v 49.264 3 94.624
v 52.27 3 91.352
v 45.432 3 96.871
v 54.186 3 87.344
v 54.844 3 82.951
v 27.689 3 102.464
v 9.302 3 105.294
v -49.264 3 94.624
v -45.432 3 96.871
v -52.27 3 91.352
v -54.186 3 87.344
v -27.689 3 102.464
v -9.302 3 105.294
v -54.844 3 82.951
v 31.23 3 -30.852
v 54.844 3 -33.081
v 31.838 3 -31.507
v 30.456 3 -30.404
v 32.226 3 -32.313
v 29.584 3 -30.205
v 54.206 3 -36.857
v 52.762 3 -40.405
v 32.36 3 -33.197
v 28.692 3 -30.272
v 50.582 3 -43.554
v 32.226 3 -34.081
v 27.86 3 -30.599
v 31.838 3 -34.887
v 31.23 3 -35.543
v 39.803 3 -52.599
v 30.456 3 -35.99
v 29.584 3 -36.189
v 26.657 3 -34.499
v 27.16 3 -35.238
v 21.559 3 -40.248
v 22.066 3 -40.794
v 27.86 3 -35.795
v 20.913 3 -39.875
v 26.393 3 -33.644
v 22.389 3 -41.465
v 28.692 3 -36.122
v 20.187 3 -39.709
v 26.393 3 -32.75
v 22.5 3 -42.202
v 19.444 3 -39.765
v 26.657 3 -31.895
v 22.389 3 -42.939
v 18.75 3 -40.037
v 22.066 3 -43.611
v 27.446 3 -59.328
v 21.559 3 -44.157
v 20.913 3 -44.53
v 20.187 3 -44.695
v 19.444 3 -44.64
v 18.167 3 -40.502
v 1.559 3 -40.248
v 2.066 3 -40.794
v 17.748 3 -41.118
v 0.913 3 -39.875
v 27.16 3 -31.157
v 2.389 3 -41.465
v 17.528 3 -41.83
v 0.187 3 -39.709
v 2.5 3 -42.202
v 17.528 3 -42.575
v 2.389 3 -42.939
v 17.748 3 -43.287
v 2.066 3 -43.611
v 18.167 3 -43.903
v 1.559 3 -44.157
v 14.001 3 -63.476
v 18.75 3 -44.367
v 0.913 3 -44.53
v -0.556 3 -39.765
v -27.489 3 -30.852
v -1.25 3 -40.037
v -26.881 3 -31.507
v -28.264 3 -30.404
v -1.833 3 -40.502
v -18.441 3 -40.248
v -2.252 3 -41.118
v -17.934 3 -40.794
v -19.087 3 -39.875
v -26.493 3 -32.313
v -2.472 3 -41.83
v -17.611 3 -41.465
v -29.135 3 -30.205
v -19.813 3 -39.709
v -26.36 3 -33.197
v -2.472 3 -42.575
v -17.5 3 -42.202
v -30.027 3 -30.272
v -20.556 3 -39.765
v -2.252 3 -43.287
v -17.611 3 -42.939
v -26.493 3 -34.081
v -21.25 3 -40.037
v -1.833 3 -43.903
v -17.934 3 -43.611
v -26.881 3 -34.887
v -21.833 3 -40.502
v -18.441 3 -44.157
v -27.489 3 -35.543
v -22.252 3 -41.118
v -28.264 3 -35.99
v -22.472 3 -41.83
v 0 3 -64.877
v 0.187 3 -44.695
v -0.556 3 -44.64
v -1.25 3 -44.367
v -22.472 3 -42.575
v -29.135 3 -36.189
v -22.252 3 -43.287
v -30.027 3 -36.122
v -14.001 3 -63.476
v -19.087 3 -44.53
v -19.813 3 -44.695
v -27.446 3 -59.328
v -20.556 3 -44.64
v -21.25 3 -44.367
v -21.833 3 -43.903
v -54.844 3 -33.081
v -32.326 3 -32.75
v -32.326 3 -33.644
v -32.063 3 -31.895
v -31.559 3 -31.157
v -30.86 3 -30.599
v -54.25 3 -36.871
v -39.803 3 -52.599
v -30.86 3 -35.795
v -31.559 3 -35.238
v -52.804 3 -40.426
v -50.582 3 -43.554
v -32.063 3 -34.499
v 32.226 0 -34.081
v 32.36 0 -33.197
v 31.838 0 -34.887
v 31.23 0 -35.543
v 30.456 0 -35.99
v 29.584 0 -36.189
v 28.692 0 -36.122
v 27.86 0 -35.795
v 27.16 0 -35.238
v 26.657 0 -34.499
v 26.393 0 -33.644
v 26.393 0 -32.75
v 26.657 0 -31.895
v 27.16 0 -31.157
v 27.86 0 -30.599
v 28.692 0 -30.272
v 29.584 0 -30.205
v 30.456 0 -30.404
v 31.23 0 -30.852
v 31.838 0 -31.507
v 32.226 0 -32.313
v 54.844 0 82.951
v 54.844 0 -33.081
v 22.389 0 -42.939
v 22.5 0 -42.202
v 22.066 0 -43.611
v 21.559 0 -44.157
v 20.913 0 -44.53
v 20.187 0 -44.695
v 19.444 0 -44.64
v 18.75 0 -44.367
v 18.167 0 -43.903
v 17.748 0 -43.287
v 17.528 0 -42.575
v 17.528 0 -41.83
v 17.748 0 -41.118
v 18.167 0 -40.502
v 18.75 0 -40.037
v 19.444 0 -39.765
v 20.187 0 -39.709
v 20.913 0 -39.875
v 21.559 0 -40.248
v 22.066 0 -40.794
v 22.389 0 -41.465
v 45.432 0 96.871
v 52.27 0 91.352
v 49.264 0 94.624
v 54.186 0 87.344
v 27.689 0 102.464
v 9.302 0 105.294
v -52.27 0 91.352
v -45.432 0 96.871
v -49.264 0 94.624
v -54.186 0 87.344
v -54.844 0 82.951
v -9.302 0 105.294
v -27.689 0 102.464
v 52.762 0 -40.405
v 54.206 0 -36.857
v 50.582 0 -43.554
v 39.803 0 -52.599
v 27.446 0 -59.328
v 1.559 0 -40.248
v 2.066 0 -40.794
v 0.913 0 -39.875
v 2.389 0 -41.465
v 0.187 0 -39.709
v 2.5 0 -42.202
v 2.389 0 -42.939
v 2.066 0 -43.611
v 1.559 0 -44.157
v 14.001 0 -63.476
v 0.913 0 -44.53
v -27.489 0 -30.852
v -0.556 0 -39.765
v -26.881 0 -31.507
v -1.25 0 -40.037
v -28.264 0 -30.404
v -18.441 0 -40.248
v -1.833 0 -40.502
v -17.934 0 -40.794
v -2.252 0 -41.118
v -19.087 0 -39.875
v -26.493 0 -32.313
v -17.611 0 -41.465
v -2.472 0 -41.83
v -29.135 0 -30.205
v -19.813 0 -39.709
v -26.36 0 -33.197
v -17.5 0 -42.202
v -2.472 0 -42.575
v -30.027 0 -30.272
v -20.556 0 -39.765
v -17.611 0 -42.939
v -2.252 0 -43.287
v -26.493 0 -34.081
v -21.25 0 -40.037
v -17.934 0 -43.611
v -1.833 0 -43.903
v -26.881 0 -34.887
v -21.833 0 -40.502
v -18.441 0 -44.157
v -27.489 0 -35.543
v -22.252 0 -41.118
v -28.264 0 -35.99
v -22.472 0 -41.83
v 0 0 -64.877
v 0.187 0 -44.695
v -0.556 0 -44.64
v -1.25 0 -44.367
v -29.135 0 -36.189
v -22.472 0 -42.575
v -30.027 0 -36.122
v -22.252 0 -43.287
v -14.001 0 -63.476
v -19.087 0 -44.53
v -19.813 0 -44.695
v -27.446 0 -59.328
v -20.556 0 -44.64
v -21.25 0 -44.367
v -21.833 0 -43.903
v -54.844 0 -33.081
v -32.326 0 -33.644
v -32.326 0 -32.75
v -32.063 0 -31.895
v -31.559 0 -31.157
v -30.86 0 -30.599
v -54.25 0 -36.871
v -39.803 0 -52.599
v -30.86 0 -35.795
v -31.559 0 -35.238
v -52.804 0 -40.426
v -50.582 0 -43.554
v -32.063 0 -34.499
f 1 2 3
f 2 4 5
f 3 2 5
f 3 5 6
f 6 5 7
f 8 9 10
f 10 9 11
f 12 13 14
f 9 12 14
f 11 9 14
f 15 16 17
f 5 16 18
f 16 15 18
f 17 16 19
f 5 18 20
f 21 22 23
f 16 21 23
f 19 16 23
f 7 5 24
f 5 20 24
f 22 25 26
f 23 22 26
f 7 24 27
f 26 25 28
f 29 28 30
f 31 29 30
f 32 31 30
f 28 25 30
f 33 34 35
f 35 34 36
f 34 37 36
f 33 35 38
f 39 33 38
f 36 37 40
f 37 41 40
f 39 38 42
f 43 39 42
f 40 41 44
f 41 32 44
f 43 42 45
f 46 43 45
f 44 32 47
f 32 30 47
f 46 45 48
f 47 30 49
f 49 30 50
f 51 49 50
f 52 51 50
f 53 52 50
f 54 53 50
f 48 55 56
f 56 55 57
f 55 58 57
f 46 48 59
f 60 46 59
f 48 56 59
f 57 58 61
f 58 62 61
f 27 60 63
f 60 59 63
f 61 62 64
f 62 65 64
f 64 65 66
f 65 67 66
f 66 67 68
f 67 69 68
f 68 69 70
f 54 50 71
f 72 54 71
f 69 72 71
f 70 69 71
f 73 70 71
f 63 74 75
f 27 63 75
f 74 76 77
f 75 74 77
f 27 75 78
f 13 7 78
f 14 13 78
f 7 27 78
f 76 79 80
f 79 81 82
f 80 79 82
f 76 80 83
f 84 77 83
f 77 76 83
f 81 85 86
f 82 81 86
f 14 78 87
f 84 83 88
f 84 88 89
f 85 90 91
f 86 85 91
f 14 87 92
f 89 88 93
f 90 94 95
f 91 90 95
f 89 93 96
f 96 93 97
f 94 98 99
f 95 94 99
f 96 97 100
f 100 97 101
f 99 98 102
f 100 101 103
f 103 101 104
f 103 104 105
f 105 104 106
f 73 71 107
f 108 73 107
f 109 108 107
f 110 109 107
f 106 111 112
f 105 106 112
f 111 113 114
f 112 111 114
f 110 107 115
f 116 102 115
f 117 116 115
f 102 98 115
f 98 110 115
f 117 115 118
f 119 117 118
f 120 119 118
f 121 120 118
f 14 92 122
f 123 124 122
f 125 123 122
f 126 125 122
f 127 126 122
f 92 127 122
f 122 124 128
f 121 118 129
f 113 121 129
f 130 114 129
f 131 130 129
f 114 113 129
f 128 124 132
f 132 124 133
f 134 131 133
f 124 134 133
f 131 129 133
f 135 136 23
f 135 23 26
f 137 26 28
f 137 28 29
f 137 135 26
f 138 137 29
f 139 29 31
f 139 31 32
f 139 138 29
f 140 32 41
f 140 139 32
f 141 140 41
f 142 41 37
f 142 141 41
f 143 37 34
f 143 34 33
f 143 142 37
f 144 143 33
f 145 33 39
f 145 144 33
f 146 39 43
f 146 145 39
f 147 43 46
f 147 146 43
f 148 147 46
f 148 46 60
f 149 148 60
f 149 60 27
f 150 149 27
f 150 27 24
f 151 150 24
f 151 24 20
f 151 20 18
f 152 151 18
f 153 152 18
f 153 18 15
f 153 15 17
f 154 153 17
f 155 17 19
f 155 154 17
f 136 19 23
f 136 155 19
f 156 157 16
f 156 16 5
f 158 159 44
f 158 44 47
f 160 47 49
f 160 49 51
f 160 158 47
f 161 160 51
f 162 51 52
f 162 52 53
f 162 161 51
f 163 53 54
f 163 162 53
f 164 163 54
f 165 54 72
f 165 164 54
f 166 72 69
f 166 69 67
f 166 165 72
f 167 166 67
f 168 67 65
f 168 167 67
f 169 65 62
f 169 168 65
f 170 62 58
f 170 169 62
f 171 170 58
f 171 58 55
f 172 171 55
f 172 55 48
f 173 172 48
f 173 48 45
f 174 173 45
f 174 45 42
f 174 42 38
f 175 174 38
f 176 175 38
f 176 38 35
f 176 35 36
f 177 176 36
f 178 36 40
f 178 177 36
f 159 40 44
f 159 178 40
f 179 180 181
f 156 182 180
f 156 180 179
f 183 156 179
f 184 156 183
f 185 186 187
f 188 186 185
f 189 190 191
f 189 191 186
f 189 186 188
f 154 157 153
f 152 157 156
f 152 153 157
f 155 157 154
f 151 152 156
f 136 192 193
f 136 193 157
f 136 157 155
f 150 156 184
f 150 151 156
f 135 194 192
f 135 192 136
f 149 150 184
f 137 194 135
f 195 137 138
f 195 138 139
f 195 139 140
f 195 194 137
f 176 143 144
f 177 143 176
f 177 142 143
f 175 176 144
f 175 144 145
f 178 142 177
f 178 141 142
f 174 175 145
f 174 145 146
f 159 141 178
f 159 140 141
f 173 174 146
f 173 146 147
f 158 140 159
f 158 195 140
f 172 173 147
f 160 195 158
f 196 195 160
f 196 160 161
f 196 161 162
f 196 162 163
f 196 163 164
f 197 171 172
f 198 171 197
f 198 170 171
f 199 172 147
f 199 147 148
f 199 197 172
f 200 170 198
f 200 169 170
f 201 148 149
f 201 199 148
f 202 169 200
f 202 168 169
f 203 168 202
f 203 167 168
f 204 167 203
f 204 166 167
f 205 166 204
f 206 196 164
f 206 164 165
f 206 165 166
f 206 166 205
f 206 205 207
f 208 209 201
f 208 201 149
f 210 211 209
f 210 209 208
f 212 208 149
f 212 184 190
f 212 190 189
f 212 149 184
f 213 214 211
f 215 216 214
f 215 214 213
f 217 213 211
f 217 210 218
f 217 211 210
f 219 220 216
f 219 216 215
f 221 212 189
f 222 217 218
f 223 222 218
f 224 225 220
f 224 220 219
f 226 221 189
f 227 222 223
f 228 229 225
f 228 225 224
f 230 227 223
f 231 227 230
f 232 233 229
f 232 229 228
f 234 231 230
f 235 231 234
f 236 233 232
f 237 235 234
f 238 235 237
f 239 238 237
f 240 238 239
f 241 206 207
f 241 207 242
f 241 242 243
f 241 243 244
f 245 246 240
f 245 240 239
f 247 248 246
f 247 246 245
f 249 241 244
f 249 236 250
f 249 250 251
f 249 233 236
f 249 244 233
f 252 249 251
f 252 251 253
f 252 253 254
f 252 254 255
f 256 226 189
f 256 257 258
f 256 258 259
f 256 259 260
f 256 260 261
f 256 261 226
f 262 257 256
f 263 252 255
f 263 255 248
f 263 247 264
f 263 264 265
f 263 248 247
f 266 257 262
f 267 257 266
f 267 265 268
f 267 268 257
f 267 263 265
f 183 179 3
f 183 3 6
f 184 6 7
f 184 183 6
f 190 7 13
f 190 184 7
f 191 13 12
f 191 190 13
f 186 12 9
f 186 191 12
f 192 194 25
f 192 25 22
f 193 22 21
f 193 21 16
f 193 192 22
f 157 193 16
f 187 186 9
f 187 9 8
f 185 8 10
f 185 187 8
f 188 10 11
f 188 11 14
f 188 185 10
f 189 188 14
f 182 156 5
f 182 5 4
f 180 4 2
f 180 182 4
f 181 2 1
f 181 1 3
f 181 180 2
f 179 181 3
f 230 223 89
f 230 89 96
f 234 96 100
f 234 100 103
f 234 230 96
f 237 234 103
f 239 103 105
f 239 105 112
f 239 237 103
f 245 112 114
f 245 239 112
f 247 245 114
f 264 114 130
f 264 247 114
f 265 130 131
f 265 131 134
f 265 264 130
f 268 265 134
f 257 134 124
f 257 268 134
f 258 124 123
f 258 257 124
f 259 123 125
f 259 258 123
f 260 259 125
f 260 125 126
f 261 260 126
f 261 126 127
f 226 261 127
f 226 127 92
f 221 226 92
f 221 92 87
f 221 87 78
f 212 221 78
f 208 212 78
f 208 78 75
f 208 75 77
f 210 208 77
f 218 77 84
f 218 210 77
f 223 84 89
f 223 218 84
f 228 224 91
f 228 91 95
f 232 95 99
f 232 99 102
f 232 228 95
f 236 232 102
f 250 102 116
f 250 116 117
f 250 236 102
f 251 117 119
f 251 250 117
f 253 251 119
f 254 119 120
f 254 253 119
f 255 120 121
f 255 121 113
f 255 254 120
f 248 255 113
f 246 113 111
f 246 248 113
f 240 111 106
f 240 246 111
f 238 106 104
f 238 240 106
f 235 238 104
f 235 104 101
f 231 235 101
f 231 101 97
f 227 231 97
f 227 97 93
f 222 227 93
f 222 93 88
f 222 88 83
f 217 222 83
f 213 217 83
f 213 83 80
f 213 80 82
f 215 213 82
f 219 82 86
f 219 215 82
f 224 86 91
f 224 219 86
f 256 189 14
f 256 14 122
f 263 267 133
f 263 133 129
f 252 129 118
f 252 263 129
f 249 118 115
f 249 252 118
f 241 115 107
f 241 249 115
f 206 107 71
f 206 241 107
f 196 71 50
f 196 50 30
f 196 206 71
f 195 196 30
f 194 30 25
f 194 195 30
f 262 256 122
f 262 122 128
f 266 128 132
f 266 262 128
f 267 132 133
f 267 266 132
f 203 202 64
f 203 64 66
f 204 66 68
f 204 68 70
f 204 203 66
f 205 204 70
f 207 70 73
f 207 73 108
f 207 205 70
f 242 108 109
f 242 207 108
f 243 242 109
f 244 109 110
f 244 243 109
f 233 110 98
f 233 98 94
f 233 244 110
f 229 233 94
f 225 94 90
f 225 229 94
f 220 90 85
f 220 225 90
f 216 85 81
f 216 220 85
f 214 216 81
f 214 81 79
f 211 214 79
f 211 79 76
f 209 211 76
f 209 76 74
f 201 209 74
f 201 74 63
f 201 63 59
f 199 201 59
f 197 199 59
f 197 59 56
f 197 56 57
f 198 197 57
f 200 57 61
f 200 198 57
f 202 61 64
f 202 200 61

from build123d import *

# Parameters (mm, degrees)
SKETCH2_R           = 3
SKETCH2_R_2         = 2.5
BOSS_EXTRUDE1_DEPTH = 3


with BuildPart() as part:
    # Sketch2 → Boss-Extrude1 (new body)
    with BuildSketch(Plane(origin=(0, 0, 0), x_dir=(1, 0, 0), z_dir=(0, 1, 0))):
        with BuildLine():
            Line((-54.843939578, -82.950592443), (-54.843939578, 33.080710792))
            ThreePointArc((-54.843939578, 33.080710792), (-53.629479142, 38.690320935), (-50.582114931, 43.554086088))
            ThreePointArc((-50.582114931, 43.554086088), (0, 64.876726435), (50.582114931, 43.554086088))
            ThreePointArc((50.582114931, 43.554086088), (53.581553542, 38.670819055), (54.843939578, 33.080710792))
            Line((54.843939578, 33.080710792), (54.843939578, -82.950592443))
            ThreePointArc((54.843939578, -82.950592443), (52.270146994, -91.352340431), (45.432023677, -96.870840864))
            ThreePointArc((45.432023677, -96.870840864), (0, -105.649395093), (-45.432023677, -96.870840864))
            ThreePointArc((-45.432023677, -96.870840864), (-52.270146994, -91.352340431), (-54.843939578, -82.950592443))
        make_face()
        with Locations((29.359626422, 33.197024949)):
            Circle(SKETCH2_R, mode=Mode.SUBTRACT)
        with Locations((-29.359626422, 33.197024949)):
            Circle(SKETCH2_R, mode=Mode.SUBTRACT)
        with Locations((0, 42.202367755)):
            Circle(SKETCH2_R_2, mode=Mode.SUBTRACT)
        with Locations((20, 42.202367755)):
            Circle(SKETCH2_R_2, mode=Mode.SUBTRACT)
        with Locations((-20, 42.202367755)):
            Circle(SKETCH2_R_2, mode=Mode.SUBTRACT)
    extrude(amount=BOSS_EXTRUDE1_DEPTH)


solid = part.part
